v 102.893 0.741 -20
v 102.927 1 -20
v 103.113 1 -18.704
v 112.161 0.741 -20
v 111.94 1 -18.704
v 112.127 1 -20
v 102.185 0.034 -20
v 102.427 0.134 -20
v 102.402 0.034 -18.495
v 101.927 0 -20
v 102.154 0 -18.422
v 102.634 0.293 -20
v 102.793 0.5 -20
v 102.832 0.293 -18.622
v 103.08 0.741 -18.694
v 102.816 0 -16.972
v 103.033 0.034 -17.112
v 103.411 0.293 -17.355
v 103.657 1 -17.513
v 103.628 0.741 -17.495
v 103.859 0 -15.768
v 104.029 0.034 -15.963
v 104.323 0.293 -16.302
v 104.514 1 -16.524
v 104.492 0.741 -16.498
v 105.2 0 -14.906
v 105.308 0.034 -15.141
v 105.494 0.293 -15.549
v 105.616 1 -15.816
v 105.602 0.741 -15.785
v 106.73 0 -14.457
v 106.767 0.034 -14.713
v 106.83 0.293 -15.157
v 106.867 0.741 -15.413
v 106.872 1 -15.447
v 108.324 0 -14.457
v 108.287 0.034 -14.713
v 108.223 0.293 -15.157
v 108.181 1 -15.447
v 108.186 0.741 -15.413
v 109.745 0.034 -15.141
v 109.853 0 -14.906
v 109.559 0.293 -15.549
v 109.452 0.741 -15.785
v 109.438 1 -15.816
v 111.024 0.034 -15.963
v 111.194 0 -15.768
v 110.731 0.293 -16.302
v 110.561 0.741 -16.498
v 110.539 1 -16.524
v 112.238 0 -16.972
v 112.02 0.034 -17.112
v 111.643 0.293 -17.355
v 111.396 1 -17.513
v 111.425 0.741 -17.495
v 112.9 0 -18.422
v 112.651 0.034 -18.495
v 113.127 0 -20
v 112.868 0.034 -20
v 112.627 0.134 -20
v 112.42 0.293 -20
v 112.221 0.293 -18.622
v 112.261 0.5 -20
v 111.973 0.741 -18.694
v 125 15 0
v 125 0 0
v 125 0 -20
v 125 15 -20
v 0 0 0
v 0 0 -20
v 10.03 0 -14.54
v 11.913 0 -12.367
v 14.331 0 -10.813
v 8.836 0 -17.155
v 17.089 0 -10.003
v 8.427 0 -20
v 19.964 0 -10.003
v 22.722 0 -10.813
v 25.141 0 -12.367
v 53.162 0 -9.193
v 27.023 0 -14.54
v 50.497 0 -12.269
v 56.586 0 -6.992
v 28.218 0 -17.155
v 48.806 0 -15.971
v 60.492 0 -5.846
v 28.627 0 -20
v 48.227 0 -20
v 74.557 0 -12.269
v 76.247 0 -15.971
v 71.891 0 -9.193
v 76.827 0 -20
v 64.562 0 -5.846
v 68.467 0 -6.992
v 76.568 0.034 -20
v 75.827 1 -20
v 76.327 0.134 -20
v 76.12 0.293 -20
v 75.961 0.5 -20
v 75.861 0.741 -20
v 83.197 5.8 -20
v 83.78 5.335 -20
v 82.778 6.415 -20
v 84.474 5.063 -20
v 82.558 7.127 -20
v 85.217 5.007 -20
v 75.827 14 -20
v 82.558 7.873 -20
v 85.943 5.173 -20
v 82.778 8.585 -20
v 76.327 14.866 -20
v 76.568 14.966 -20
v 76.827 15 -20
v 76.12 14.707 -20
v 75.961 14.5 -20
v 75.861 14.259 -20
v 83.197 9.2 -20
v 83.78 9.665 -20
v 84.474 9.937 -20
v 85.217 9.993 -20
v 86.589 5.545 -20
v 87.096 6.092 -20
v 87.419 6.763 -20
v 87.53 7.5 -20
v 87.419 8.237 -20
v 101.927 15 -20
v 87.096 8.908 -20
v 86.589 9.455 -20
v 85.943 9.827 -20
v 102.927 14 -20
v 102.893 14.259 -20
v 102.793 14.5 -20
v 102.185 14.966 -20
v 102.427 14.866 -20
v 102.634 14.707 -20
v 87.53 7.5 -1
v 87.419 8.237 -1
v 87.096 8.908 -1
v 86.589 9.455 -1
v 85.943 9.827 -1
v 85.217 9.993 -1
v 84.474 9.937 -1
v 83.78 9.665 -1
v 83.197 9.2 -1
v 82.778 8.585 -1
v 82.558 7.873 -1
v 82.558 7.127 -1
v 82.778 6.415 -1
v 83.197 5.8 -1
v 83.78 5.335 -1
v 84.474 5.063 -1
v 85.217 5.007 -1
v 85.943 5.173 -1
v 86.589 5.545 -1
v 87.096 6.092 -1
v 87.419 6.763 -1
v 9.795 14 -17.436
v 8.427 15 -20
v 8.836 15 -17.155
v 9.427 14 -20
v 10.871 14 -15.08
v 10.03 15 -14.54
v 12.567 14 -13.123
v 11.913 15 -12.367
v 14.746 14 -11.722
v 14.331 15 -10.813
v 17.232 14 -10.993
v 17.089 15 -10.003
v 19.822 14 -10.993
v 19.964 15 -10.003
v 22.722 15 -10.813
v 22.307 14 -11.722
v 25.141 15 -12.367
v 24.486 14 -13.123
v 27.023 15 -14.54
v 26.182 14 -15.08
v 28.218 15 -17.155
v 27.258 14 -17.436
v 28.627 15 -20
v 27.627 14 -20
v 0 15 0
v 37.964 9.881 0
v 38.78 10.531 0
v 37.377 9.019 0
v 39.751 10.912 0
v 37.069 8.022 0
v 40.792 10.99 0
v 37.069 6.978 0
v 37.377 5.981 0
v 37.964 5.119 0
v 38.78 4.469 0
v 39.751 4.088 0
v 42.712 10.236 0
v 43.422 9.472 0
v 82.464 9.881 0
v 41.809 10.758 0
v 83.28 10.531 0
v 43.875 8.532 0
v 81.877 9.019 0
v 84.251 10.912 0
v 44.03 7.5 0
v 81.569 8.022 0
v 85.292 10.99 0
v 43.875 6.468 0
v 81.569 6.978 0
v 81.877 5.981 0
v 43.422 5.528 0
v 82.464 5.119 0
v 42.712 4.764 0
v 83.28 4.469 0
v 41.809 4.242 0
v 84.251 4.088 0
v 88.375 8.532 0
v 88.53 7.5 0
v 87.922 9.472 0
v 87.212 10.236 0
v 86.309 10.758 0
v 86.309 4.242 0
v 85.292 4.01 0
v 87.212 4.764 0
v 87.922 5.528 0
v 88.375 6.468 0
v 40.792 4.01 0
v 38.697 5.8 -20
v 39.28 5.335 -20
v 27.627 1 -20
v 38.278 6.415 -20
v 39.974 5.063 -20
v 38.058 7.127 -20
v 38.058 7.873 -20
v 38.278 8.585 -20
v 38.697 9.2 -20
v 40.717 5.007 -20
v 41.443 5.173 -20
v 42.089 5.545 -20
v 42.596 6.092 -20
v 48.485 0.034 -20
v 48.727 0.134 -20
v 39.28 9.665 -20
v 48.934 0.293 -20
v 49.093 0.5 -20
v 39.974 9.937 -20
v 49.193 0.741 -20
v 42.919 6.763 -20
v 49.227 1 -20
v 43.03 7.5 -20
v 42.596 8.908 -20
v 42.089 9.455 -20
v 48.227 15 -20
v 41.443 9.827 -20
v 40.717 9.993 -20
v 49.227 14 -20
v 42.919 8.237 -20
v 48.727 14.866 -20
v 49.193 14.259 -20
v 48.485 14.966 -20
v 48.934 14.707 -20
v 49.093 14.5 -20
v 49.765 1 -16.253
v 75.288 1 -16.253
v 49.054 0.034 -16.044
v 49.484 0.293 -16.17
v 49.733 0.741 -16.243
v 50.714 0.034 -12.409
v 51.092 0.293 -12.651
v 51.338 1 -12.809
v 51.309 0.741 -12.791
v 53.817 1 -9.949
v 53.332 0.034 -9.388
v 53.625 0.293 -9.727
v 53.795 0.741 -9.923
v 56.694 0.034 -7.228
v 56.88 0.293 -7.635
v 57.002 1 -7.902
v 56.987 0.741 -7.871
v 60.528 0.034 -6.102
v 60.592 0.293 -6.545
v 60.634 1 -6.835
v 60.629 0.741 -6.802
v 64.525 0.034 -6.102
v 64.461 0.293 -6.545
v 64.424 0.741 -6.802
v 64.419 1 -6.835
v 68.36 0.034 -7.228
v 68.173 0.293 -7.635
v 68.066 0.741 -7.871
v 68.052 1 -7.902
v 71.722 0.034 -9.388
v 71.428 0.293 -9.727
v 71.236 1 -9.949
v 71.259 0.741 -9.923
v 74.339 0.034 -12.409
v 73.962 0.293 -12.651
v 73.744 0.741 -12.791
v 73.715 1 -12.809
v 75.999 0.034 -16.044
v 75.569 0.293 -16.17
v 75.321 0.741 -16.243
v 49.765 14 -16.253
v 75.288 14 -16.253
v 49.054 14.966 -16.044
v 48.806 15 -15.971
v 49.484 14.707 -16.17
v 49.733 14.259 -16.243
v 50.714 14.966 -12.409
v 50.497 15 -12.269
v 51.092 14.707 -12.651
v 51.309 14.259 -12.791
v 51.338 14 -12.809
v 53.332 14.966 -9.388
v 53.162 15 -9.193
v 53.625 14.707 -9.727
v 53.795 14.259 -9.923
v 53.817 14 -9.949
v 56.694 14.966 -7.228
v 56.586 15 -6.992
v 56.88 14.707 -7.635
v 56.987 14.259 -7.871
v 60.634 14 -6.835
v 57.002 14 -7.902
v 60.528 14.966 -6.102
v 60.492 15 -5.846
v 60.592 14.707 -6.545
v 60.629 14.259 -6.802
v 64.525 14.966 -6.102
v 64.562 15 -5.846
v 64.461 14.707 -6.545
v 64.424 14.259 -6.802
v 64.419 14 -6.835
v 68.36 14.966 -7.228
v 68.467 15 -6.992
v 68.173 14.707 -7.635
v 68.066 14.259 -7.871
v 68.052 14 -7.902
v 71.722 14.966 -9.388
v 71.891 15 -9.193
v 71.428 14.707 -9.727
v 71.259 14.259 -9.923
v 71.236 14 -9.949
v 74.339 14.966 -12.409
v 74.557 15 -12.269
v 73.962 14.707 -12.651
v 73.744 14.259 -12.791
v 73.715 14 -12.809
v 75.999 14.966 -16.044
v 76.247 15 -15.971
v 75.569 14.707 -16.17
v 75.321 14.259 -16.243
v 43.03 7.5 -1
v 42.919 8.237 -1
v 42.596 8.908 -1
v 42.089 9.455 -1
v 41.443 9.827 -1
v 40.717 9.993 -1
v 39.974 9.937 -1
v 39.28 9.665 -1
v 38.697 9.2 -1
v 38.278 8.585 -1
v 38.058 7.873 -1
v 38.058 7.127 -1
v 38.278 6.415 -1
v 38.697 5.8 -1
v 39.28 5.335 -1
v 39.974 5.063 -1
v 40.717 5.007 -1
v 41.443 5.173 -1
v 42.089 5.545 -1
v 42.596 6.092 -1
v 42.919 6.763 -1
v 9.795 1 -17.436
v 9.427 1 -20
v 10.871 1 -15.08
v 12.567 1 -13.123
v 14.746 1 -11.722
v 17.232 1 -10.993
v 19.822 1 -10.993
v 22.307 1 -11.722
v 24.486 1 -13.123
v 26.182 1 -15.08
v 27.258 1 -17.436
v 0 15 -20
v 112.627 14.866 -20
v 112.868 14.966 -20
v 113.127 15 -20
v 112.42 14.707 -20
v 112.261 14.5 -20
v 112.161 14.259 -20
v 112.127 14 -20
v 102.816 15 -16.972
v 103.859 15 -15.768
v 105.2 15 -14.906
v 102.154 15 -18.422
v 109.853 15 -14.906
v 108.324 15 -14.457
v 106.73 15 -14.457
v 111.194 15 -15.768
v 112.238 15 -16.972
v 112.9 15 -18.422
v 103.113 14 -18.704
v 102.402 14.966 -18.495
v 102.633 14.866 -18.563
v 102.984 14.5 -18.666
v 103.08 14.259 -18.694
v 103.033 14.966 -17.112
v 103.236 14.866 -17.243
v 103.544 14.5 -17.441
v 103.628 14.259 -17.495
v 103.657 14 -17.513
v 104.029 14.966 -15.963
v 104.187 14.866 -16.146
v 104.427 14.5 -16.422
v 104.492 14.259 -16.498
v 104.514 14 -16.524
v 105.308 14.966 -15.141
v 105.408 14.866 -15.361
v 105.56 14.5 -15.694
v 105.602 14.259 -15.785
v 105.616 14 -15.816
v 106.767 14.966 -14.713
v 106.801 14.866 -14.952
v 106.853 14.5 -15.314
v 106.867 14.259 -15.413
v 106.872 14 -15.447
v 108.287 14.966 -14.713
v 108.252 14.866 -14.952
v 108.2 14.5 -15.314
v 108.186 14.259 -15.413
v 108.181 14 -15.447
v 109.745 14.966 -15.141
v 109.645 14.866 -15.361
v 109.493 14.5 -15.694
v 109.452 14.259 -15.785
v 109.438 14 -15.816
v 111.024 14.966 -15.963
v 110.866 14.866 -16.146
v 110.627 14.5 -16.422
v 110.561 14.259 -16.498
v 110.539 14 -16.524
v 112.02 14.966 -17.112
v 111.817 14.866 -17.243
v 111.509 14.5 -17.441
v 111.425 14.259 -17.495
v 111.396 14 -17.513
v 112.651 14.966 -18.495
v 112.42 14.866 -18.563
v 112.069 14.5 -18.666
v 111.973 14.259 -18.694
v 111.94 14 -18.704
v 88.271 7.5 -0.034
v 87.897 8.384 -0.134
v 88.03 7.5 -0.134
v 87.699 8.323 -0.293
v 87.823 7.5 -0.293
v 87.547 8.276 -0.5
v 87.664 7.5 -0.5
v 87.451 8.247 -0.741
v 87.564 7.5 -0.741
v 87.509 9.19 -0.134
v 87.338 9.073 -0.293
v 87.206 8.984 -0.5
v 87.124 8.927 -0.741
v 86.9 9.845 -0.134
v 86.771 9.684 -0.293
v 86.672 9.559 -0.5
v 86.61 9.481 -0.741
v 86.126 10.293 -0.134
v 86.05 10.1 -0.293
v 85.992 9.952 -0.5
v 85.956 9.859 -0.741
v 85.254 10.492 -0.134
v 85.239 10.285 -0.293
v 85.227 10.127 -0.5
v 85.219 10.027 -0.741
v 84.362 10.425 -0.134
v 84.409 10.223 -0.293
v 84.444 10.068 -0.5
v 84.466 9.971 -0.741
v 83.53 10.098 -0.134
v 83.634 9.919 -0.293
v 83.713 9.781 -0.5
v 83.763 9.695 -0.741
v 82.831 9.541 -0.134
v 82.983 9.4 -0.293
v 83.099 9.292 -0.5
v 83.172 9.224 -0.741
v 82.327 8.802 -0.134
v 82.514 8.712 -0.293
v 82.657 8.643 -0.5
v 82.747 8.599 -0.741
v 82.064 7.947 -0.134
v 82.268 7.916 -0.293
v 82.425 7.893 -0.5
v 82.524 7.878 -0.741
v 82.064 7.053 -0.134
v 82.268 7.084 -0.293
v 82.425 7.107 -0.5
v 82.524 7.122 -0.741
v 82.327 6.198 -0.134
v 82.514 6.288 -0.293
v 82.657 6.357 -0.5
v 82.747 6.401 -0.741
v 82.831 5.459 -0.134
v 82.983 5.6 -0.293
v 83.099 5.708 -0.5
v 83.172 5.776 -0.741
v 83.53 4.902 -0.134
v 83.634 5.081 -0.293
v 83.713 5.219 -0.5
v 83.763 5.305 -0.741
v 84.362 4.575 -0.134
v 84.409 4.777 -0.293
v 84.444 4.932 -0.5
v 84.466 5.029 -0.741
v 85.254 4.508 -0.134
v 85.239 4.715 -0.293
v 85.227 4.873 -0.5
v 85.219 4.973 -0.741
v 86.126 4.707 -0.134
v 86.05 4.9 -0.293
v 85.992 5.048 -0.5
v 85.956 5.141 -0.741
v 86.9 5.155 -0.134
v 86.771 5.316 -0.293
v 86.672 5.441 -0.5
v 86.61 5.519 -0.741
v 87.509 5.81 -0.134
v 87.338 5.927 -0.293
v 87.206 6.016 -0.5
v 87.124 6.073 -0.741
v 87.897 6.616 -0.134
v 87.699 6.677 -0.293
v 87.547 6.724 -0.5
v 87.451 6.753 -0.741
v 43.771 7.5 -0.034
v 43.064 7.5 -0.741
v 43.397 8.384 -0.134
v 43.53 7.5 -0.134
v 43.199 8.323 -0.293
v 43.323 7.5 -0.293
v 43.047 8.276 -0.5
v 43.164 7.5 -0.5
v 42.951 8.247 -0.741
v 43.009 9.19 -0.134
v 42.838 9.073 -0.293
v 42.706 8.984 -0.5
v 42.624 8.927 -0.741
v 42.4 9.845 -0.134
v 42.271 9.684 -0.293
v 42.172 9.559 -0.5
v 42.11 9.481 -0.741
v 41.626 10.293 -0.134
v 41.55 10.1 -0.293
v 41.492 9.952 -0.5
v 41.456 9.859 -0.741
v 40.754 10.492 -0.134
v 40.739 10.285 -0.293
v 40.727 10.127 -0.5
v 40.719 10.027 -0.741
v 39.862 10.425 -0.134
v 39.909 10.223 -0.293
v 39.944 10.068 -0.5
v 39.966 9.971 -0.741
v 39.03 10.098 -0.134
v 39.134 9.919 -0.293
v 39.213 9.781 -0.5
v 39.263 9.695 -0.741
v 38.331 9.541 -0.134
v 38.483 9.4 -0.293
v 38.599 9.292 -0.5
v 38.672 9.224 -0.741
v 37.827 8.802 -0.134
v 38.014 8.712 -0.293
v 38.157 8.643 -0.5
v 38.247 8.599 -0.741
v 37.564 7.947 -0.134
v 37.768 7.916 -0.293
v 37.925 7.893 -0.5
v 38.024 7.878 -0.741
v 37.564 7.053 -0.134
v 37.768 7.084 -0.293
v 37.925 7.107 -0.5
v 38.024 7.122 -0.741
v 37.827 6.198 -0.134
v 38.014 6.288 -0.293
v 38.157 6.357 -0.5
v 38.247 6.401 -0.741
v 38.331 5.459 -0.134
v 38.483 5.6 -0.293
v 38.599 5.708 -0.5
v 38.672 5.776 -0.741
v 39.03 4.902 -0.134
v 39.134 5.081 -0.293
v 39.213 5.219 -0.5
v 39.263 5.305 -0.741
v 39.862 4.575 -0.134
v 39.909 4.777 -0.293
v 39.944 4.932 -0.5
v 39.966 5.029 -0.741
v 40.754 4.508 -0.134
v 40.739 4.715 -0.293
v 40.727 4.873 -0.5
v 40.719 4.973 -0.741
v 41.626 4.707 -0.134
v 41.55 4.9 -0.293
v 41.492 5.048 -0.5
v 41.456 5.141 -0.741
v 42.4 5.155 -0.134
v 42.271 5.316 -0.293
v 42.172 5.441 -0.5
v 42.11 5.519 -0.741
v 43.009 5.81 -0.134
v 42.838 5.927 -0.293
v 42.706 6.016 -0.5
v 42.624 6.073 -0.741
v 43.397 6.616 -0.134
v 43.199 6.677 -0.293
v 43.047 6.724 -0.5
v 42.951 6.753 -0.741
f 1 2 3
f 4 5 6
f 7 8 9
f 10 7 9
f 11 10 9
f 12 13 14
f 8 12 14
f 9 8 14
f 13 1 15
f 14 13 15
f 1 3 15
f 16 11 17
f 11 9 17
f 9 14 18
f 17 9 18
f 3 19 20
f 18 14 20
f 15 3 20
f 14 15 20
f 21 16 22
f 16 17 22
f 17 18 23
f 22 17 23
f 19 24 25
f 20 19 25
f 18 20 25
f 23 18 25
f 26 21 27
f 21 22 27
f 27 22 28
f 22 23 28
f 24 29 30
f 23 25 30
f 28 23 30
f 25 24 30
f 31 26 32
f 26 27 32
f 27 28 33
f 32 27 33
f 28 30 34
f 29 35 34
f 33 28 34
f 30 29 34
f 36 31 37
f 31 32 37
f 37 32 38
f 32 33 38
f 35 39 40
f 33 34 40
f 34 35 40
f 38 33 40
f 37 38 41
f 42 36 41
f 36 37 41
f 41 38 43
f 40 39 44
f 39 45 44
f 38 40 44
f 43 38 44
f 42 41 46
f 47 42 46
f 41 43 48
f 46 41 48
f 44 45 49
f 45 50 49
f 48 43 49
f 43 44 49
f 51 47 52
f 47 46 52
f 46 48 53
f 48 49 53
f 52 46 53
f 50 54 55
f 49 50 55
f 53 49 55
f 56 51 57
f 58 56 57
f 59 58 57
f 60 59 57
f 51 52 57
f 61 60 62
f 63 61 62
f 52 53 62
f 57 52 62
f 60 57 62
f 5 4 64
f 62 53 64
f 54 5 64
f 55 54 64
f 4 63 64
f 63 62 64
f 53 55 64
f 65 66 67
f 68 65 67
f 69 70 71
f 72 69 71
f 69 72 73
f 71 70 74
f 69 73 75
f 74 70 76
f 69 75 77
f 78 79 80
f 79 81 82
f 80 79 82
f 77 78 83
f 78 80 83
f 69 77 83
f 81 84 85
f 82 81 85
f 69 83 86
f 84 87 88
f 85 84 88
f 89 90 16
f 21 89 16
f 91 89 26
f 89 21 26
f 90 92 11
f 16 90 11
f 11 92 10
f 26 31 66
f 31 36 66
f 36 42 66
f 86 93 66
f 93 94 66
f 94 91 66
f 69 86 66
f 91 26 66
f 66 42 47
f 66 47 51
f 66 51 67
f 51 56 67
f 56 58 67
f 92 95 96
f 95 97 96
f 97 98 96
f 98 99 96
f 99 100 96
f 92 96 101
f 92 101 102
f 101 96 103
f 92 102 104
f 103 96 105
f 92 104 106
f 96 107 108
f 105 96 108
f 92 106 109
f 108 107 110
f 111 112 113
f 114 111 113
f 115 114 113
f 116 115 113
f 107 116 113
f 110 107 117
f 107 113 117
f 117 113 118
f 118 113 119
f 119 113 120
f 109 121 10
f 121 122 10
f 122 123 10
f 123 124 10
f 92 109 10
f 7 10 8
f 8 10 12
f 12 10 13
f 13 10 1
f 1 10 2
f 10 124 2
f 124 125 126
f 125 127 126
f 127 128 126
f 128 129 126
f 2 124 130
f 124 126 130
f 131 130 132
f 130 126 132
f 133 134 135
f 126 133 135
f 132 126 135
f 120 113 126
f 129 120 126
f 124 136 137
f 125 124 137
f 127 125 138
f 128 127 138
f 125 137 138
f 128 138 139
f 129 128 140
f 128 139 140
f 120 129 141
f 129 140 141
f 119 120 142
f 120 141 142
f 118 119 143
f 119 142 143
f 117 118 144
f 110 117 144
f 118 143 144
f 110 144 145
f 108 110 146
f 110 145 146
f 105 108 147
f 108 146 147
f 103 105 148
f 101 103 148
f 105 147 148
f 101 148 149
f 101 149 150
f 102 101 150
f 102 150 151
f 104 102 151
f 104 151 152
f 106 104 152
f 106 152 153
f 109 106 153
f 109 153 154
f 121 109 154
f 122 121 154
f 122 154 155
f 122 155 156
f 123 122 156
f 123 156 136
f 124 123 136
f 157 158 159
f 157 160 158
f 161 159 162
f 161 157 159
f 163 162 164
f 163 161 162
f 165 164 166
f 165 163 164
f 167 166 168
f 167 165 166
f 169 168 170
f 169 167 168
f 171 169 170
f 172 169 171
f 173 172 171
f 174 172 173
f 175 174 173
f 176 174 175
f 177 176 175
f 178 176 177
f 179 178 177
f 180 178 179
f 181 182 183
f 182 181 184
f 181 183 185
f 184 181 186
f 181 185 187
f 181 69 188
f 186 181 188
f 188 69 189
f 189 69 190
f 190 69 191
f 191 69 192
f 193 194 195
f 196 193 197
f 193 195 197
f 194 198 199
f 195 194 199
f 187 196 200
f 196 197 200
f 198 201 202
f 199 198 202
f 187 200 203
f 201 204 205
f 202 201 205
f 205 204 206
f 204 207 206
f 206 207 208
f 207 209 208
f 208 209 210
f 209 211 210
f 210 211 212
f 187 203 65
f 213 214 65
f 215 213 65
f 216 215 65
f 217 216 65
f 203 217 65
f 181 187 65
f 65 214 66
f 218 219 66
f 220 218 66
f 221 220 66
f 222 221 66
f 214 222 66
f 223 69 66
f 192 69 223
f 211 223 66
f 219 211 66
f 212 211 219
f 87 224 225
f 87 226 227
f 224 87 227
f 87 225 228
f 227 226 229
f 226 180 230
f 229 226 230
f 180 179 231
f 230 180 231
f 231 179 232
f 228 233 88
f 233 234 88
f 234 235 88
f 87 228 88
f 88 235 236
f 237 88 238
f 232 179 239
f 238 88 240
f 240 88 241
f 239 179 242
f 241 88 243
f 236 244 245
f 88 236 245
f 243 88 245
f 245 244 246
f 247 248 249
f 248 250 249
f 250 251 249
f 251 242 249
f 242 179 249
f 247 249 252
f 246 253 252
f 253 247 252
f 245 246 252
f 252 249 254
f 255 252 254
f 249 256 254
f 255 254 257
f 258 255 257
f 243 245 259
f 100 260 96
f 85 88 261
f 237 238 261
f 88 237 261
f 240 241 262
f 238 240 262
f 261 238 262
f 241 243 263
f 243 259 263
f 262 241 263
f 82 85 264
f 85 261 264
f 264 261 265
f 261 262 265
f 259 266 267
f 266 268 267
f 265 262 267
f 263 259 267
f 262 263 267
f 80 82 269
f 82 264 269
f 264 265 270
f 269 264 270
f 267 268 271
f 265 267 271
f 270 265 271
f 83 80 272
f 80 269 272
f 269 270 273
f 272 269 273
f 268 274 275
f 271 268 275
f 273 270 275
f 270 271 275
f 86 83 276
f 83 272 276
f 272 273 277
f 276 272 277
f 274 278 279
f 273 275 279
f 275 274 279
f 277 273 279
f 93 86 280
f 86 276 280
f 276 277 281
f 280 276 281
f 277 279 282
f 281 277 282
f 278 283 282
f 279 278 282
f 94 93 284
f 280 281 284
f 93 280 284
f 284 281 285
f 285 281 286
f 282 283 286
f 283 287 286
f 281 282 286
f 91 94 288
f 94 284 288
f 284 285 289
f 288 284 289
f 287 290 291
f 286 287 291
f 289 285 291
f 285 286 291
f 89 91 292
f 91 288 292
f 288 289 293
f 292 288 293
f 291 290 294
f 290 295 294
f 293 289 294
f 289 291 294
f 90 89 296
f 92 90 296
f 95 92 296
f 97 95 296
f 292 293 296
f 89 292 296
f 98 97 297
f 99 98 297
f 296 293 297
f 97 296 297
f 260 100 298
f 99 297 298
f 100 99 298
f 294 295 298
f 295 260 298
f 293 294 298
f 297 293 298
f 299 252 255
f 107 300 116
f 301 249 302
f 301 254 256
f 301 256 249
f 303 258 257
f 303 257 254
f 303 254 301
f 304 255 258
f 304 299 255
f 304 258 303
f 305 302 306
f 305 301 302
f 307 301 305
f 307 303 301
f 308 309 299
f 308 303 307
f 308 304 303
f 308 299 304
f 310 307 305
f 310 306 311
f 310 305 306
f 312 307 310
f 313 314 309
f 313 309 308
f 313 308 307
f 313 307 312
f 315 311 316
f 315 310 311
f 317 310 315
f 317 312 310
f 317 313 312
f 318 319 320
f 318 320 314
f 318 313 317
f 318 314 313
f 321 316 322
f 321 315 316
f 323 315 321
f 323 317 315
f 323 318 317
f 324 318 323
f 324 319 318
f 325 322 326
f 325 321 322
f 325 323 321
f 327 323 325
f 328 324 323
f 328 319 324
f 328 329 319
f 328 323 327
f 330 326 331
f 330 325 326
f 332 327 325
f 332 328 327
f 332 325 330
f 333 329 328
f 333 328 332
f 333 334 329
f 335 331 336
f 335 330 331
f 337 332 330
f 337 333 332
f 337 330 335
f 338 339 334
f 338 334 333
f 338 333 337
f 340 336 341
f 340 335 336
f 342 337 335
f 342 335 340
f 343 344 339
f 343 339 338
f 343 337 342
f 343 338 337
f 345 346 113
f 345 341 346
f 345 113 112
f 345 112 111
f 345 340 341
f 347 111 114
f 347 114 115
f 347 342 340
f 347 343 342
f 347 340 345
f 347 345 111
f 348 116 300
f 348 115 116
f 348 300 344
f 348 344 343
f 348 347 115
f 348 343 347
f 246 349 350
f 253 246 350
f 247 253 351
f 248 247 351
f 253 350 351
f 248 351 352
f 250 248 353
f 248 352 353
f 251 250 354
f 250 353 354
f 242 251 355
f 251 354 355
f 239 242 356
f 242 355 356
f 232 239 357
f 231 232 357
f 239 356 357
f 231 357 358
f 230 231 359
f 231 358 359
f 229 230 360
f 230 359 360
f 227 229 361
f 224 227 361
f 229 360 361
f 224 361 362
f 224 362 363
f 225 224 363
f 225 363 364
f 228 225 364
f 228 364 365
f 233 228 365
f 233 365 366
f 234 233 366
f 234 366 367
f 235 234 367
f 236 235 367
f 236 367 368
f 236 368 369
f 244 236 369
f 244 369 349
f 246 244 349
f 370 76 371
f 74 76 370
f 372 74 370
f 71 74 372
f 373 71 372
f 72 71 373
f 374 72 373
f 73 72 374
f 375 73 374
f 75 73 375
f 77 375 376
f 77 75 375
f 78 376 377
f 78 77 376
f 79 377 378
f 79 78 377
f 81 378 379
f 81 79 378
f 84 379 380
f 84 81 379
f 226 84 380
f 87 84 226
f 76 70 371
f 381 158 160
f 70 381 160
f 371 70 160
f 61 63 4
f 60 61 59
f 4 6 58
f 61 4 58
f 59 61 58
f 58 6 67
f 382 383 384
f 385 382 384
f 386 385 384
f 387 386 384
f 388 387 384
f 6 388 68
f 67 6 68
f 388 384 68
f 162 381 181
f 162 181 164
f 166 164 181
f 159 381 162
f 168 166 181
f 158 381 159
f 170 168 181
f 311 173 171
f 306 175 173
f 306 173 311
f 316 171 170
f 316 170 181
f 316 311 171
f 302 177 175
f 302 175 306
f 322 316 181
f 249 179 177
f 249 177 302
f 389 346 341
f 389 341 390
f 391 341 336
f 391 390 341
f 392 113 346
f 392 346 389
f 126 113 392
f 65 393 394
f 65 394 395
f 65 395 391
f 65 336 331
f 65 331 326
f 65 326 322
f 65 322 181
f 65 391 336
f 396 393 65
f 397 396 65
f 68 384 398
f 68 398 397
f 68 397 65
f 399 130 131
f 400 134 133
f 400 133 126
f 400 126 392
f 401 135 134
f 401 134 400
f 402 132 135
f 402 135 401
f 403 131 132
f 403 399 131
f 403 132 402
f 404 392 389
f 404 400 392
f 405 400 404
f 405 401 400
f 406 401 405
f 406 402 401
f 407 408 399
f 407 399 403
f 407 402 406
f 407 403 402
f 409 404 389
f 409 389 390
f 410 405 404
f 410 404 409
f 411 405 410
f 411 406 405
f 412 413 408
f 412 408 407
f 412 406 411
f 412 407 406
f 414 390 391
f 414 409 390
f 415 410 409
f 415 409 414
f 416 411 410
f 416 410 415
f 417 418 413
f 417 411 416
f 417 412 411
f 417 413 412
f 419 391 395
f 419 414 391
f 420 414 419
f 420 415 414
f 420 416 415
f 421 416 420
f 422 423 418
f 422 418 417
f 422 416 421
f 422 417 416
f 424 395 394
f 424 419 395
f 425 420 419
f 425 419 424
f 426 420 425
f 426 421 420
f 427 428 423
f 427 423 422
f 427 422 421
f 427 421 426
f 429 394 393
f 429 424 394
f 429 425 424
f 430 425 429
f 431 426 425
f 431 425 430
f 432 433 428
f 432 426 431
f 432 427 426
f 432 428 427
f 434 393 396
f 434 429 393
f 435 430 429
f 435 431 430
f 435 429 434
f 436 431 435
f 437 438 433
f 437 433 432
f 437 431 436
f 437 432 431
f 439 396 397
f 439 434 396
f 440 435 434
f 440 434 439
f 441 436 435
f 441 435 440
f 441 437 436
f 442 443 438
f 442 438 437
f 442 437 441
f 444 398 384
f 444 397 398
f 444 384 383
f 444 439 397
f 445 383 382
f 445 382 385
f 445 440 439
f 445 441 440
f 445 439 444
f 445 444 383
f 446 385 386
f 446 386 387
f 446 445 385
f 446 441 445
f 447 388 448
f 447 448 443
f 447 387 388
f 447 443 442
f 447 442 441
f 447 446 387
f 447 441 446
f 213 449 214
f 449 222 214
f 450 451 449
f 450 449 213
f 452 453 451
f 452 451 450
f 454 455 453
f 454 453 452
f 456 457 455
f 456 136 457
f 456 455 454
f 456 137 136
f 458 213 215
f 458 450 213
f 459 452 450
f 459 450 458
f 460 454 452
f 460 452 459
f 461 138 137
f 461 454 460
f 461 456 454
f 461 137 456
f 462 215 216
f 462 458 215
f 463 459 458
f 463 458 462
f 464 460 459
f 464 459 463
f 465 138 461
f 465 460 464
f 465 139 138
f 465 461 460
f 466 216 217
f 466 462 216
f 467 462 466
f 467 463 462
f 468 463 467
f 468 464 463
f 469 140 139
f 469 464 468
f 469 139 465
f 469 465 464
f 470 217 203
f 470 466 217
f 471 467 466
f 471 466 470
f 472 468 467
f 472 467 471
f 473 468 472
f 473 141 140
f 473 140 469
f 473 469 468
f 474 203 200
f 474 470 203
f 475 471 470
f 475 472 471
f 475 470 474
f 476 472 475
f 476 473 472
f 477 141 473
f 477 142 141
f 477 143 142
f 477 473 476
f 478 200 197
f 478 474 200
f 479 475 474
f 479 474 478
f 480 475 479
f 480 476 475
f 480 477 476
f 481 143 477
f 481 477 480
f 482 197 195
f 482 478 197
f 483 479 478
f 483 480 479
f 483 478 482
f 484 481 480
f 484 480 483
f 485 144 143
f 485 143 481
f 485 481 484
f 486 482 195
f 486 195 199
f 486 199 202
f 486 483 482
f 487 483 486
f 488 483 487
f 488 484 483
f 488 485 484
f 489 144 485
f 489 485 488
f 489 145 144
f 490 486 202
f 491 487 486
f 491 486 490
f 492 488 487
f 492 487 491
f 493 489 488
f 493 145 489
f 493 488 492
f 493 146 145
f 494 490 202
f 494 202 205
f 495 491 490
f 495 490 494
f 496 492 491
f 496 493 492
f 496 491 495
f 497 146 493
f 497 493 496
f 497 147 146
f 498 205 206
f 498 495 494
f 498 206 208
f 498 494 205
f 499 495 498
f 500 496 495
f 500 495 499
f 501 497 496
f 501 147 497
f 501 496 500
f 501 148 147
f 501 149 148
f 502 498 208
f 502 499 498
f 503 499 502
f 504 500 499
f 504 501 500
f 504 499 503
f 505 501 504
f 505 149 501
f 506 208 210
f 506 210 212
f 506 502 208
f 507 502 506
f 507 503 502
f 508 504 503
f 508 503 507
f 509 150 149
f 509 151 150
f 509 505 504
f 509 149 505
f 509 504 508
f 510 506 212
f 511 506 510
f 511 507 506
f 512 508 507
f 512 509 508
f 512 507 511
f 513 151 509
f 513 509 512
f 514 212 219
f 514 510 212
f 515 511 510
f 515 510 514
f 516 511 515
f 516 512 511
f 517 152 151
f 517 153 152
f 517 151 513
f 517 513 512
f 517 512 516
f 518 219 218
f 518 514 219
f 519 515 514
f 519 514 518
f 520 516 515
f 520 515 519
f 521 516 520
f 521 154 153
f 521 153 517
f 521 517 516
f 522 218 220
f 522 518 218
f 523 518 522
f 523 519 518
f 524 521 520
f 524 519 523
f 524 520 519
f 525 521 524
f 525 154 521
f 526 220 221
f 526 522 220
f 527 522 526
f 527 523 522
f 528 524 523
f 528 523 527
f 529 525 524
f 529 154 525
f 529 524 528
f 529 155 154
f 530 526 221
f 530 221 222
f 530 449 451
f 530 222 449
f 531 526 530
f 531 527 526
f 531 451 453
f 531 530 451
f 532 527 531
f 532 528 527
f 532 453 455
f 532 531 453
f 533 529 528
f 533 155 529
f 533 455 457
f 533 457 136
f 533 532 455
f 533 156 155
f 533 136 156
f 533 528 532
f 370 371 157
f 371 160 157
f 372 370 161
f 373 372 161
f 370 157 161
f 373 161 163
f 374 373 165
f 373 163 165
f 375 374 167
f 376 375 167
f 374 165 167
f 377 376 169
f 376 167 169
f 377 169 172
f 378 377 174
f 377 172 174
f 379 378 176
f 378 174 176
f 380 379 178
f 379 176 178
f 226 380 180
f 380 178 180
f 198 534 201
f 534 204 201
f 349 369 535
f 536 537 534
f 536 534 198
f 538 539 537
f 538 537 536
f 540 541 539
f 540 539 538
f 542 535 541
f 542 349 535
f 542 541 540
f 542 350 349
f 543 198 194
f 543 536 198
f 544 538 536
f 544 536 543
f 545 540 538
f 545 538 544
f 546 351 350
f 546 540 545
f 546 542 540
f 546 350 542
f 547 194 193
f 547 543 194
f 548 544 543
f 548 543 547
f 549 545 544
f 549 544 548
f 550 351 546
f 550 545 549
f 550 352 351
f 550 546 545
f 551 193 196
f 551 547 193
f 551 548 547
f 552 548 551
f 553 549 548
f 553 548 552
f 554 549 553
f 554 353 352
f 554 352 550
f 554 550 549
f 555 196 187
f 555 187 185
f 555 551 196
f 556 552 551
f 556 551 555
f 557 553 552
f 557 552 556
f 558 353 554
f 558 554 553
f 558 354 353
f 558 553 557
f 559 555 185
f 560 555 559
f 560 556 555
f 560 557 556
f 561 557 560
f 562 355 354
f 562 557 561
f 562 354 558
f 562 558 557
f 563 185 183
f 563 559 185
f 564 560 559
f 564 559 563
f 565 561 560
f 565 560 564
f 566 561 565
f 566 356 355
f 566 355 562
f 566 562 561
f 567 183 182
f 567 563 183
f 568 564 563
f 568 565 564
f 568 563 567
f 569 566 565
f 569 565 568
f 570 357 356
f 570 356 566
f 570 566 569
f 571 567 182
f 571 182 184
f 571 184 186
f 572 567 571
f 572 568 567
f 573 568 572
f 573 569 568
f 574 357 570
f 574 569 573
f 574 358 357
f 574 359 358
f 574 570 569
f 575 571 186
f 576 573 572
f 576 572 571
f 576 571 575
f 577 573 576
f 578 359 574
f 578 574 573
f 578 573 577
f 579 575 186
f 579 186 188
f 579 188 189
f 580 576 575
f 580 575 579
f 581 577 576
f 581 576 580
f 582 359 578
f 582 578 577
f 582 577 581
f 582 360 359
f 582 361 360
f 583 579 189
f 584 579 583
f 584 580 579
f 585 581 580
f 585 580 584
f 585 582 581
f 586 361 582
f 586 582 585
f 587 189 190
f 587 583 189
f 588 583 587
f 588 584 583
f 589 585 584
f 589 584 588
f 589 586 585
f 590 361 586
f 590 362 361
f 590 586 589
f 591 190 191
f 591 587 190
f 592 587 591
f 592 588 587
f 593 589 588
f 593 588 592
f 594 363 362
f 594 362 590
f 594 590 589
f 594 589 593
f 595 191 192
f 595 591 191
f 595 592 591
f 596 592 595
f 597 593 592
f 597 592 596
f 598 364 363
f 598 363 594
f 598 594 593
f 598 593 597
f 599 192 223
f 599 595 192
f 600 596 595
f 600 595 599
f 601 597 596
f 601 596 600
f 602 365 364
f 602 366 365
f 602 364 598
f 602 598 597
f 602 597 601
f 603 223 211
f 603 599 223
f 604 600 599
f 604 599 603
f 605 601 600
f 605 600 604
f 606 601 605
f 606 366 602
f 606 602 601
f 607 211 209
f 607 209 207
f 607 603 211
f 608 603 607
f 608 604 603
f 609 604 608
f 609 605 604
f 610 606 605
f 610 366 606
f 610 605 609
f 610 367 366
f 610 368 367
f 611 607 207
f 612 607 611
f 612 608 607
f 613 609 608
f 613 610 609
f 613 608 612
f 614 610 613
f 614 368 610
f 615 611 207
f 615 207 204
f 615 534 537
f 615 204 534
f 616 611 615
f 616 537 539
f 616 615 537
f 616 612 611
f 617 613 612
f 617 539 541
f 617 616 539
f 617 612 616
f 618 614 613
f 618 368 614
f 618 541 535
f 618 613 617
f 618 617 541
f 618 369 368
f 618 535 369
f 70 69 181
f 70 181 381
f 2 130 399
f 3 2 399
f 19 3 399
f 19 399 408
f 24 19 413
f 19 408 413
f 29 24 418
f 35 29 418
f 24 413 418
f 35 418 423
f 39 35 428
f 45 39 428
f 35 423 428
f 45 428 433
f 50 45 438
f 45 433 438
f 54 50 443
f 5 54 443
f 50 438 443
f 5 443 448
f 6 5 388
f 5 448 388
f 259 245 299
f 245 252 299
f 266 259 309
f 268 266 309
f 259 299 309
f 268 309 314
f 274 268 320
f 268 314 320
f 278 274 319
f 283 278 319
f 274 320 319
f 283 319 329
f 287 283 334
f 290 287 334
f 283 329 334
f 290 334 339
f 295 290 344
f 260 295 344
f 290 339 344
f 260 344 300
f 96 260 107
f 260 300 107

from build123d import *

# Parameters (mm, degrees)
SKETCH_1_W          = 125
SKETCH_1_H          = 40
EXTRUDE_1_DEPTH     = 15
SKETCH_2_R          = 9.1
SKETCH_2_R_2        = 4.6
SKETCH_2_R_3        = 13.3
CUT_EXTRUDE_1_DEPTH = 133.098448136
CHAMFER_1_SIZE      = 1
CHAMFER_2_SIZE      = 1
FILLET_1_R          = 1
SKETCH_3_R          = 2.5
CUT_EXTRUDE_2_DEPTH = 133.098448136
FILLET_2_R          = 1
SKETCH_5_W          = 130.4461144
SKETCH_5_H          = 31.847563365
CUT_EXTRUDE_3_DEPTH = 133.098448178


with BuildPart() as part:
    # 草圖1 → 填料-伸長1 (new body)
    with BuildSketch(Plane(origin=(0, 0, 0), x_dir=(1, 0, 0), z_dir=(0, 1, 0))):
        with Locations((62.5, 20)):
            Rectangle(SKETCH_1_W, SKETCH_1_H)
    extrude(amount=EXTRUDE_1_DEPTH)

    # 草圖2 → 除料-伸長1 (cut, through all)
    with BuildSketch(Plane(origin=(0, 15, 0), x_dir=(1, 0, 0), z_dir=(0, 1, 0))):
        with Locations(Location((18.526668527, 20, 0), (0, 0, 270))):
            Circle(SKETCH_2_R)
        with Locations(Location((107.526668527, 20, 0), (0, 0, 270))):
            Circle(SKETCH_2_R_2)
        with Locations(Location((62.526668527, 20, 0), (0, 0, 270))):
            Circle(SKETCH_2_R_3)
    extrude(amount=-CUT_EXTRUDE_1_DEPTH, mode=Mode.SUBTRACT)

    # 導角1
    chamfer_1_edges = [part.edges().sort_by_distance(p)[0] for p in [
        (18.526668527, 15, -29.1),
    ]]
    chamfer(chamfer_1_edges, length=CHAMFER_1_SIZE)

    # 導角2
    chamfer_2_edges = [part.edges().sort_by_distance(p)[0] for p in [
        (18.526668527, 0, -29.1),
    ]]
    chamfer(chamfer_2_edges, length=CHAMFER_2_SIZE)

    # 圓角1
    fillet_1_edges = [part.edges().sort_by_distance(p)[0] for p in [
        (107.526668527, 0, -24.6),
        (107.526668527, 15, -24.6),
        (62.526668527, 0, -33.3),
        (62.526668527, 15, -33.3),
    ]]
    fillet(fillet_1_edges, radius=FILLET_1_R)

    # 草圖3 → 除料-伸長2 (cut, through all)
    with BuildSketch(Plane.XY):
        with Locations((40.53, 7.5)):
            Circle(SKETCH_3_R)
        with Locations((85.03, 7.5)):
            Circle(SKETCH_3_R)
    extrude(amount=-CUT_EXTRUDE_2_DEPTH, mode=Mode.SUBTRACT)

    # 圓角2
    fillet_2_edges = [part.edges().sort_by_distance(p)[0] for p in [
        (38.03, 7.5, -40),
        (38.03, 7.5, 0),
        (82.53, 7.5, -40),
        (82.53, 7.5, 0),
    ]]
    fillet(fillet_2_edges, radius=FILLET_2_R)

    # 草圖5 → 除料-伸長3 (cut, through all)
    with BuildSketch(Plane(origin=(0, 15, 0), x_dir=(1, 0, 0), z_dir=(0, 1, 0))):
        with Locations((65.2230572, 35.923781683)):
            Rectangle(SKETCH_5_W, SKETCH_5_H)
    extrude(amount=-CUT_EXTRUDE_3_DEPTH, mode=Mode.SUBTRACT)


solid = part.part
